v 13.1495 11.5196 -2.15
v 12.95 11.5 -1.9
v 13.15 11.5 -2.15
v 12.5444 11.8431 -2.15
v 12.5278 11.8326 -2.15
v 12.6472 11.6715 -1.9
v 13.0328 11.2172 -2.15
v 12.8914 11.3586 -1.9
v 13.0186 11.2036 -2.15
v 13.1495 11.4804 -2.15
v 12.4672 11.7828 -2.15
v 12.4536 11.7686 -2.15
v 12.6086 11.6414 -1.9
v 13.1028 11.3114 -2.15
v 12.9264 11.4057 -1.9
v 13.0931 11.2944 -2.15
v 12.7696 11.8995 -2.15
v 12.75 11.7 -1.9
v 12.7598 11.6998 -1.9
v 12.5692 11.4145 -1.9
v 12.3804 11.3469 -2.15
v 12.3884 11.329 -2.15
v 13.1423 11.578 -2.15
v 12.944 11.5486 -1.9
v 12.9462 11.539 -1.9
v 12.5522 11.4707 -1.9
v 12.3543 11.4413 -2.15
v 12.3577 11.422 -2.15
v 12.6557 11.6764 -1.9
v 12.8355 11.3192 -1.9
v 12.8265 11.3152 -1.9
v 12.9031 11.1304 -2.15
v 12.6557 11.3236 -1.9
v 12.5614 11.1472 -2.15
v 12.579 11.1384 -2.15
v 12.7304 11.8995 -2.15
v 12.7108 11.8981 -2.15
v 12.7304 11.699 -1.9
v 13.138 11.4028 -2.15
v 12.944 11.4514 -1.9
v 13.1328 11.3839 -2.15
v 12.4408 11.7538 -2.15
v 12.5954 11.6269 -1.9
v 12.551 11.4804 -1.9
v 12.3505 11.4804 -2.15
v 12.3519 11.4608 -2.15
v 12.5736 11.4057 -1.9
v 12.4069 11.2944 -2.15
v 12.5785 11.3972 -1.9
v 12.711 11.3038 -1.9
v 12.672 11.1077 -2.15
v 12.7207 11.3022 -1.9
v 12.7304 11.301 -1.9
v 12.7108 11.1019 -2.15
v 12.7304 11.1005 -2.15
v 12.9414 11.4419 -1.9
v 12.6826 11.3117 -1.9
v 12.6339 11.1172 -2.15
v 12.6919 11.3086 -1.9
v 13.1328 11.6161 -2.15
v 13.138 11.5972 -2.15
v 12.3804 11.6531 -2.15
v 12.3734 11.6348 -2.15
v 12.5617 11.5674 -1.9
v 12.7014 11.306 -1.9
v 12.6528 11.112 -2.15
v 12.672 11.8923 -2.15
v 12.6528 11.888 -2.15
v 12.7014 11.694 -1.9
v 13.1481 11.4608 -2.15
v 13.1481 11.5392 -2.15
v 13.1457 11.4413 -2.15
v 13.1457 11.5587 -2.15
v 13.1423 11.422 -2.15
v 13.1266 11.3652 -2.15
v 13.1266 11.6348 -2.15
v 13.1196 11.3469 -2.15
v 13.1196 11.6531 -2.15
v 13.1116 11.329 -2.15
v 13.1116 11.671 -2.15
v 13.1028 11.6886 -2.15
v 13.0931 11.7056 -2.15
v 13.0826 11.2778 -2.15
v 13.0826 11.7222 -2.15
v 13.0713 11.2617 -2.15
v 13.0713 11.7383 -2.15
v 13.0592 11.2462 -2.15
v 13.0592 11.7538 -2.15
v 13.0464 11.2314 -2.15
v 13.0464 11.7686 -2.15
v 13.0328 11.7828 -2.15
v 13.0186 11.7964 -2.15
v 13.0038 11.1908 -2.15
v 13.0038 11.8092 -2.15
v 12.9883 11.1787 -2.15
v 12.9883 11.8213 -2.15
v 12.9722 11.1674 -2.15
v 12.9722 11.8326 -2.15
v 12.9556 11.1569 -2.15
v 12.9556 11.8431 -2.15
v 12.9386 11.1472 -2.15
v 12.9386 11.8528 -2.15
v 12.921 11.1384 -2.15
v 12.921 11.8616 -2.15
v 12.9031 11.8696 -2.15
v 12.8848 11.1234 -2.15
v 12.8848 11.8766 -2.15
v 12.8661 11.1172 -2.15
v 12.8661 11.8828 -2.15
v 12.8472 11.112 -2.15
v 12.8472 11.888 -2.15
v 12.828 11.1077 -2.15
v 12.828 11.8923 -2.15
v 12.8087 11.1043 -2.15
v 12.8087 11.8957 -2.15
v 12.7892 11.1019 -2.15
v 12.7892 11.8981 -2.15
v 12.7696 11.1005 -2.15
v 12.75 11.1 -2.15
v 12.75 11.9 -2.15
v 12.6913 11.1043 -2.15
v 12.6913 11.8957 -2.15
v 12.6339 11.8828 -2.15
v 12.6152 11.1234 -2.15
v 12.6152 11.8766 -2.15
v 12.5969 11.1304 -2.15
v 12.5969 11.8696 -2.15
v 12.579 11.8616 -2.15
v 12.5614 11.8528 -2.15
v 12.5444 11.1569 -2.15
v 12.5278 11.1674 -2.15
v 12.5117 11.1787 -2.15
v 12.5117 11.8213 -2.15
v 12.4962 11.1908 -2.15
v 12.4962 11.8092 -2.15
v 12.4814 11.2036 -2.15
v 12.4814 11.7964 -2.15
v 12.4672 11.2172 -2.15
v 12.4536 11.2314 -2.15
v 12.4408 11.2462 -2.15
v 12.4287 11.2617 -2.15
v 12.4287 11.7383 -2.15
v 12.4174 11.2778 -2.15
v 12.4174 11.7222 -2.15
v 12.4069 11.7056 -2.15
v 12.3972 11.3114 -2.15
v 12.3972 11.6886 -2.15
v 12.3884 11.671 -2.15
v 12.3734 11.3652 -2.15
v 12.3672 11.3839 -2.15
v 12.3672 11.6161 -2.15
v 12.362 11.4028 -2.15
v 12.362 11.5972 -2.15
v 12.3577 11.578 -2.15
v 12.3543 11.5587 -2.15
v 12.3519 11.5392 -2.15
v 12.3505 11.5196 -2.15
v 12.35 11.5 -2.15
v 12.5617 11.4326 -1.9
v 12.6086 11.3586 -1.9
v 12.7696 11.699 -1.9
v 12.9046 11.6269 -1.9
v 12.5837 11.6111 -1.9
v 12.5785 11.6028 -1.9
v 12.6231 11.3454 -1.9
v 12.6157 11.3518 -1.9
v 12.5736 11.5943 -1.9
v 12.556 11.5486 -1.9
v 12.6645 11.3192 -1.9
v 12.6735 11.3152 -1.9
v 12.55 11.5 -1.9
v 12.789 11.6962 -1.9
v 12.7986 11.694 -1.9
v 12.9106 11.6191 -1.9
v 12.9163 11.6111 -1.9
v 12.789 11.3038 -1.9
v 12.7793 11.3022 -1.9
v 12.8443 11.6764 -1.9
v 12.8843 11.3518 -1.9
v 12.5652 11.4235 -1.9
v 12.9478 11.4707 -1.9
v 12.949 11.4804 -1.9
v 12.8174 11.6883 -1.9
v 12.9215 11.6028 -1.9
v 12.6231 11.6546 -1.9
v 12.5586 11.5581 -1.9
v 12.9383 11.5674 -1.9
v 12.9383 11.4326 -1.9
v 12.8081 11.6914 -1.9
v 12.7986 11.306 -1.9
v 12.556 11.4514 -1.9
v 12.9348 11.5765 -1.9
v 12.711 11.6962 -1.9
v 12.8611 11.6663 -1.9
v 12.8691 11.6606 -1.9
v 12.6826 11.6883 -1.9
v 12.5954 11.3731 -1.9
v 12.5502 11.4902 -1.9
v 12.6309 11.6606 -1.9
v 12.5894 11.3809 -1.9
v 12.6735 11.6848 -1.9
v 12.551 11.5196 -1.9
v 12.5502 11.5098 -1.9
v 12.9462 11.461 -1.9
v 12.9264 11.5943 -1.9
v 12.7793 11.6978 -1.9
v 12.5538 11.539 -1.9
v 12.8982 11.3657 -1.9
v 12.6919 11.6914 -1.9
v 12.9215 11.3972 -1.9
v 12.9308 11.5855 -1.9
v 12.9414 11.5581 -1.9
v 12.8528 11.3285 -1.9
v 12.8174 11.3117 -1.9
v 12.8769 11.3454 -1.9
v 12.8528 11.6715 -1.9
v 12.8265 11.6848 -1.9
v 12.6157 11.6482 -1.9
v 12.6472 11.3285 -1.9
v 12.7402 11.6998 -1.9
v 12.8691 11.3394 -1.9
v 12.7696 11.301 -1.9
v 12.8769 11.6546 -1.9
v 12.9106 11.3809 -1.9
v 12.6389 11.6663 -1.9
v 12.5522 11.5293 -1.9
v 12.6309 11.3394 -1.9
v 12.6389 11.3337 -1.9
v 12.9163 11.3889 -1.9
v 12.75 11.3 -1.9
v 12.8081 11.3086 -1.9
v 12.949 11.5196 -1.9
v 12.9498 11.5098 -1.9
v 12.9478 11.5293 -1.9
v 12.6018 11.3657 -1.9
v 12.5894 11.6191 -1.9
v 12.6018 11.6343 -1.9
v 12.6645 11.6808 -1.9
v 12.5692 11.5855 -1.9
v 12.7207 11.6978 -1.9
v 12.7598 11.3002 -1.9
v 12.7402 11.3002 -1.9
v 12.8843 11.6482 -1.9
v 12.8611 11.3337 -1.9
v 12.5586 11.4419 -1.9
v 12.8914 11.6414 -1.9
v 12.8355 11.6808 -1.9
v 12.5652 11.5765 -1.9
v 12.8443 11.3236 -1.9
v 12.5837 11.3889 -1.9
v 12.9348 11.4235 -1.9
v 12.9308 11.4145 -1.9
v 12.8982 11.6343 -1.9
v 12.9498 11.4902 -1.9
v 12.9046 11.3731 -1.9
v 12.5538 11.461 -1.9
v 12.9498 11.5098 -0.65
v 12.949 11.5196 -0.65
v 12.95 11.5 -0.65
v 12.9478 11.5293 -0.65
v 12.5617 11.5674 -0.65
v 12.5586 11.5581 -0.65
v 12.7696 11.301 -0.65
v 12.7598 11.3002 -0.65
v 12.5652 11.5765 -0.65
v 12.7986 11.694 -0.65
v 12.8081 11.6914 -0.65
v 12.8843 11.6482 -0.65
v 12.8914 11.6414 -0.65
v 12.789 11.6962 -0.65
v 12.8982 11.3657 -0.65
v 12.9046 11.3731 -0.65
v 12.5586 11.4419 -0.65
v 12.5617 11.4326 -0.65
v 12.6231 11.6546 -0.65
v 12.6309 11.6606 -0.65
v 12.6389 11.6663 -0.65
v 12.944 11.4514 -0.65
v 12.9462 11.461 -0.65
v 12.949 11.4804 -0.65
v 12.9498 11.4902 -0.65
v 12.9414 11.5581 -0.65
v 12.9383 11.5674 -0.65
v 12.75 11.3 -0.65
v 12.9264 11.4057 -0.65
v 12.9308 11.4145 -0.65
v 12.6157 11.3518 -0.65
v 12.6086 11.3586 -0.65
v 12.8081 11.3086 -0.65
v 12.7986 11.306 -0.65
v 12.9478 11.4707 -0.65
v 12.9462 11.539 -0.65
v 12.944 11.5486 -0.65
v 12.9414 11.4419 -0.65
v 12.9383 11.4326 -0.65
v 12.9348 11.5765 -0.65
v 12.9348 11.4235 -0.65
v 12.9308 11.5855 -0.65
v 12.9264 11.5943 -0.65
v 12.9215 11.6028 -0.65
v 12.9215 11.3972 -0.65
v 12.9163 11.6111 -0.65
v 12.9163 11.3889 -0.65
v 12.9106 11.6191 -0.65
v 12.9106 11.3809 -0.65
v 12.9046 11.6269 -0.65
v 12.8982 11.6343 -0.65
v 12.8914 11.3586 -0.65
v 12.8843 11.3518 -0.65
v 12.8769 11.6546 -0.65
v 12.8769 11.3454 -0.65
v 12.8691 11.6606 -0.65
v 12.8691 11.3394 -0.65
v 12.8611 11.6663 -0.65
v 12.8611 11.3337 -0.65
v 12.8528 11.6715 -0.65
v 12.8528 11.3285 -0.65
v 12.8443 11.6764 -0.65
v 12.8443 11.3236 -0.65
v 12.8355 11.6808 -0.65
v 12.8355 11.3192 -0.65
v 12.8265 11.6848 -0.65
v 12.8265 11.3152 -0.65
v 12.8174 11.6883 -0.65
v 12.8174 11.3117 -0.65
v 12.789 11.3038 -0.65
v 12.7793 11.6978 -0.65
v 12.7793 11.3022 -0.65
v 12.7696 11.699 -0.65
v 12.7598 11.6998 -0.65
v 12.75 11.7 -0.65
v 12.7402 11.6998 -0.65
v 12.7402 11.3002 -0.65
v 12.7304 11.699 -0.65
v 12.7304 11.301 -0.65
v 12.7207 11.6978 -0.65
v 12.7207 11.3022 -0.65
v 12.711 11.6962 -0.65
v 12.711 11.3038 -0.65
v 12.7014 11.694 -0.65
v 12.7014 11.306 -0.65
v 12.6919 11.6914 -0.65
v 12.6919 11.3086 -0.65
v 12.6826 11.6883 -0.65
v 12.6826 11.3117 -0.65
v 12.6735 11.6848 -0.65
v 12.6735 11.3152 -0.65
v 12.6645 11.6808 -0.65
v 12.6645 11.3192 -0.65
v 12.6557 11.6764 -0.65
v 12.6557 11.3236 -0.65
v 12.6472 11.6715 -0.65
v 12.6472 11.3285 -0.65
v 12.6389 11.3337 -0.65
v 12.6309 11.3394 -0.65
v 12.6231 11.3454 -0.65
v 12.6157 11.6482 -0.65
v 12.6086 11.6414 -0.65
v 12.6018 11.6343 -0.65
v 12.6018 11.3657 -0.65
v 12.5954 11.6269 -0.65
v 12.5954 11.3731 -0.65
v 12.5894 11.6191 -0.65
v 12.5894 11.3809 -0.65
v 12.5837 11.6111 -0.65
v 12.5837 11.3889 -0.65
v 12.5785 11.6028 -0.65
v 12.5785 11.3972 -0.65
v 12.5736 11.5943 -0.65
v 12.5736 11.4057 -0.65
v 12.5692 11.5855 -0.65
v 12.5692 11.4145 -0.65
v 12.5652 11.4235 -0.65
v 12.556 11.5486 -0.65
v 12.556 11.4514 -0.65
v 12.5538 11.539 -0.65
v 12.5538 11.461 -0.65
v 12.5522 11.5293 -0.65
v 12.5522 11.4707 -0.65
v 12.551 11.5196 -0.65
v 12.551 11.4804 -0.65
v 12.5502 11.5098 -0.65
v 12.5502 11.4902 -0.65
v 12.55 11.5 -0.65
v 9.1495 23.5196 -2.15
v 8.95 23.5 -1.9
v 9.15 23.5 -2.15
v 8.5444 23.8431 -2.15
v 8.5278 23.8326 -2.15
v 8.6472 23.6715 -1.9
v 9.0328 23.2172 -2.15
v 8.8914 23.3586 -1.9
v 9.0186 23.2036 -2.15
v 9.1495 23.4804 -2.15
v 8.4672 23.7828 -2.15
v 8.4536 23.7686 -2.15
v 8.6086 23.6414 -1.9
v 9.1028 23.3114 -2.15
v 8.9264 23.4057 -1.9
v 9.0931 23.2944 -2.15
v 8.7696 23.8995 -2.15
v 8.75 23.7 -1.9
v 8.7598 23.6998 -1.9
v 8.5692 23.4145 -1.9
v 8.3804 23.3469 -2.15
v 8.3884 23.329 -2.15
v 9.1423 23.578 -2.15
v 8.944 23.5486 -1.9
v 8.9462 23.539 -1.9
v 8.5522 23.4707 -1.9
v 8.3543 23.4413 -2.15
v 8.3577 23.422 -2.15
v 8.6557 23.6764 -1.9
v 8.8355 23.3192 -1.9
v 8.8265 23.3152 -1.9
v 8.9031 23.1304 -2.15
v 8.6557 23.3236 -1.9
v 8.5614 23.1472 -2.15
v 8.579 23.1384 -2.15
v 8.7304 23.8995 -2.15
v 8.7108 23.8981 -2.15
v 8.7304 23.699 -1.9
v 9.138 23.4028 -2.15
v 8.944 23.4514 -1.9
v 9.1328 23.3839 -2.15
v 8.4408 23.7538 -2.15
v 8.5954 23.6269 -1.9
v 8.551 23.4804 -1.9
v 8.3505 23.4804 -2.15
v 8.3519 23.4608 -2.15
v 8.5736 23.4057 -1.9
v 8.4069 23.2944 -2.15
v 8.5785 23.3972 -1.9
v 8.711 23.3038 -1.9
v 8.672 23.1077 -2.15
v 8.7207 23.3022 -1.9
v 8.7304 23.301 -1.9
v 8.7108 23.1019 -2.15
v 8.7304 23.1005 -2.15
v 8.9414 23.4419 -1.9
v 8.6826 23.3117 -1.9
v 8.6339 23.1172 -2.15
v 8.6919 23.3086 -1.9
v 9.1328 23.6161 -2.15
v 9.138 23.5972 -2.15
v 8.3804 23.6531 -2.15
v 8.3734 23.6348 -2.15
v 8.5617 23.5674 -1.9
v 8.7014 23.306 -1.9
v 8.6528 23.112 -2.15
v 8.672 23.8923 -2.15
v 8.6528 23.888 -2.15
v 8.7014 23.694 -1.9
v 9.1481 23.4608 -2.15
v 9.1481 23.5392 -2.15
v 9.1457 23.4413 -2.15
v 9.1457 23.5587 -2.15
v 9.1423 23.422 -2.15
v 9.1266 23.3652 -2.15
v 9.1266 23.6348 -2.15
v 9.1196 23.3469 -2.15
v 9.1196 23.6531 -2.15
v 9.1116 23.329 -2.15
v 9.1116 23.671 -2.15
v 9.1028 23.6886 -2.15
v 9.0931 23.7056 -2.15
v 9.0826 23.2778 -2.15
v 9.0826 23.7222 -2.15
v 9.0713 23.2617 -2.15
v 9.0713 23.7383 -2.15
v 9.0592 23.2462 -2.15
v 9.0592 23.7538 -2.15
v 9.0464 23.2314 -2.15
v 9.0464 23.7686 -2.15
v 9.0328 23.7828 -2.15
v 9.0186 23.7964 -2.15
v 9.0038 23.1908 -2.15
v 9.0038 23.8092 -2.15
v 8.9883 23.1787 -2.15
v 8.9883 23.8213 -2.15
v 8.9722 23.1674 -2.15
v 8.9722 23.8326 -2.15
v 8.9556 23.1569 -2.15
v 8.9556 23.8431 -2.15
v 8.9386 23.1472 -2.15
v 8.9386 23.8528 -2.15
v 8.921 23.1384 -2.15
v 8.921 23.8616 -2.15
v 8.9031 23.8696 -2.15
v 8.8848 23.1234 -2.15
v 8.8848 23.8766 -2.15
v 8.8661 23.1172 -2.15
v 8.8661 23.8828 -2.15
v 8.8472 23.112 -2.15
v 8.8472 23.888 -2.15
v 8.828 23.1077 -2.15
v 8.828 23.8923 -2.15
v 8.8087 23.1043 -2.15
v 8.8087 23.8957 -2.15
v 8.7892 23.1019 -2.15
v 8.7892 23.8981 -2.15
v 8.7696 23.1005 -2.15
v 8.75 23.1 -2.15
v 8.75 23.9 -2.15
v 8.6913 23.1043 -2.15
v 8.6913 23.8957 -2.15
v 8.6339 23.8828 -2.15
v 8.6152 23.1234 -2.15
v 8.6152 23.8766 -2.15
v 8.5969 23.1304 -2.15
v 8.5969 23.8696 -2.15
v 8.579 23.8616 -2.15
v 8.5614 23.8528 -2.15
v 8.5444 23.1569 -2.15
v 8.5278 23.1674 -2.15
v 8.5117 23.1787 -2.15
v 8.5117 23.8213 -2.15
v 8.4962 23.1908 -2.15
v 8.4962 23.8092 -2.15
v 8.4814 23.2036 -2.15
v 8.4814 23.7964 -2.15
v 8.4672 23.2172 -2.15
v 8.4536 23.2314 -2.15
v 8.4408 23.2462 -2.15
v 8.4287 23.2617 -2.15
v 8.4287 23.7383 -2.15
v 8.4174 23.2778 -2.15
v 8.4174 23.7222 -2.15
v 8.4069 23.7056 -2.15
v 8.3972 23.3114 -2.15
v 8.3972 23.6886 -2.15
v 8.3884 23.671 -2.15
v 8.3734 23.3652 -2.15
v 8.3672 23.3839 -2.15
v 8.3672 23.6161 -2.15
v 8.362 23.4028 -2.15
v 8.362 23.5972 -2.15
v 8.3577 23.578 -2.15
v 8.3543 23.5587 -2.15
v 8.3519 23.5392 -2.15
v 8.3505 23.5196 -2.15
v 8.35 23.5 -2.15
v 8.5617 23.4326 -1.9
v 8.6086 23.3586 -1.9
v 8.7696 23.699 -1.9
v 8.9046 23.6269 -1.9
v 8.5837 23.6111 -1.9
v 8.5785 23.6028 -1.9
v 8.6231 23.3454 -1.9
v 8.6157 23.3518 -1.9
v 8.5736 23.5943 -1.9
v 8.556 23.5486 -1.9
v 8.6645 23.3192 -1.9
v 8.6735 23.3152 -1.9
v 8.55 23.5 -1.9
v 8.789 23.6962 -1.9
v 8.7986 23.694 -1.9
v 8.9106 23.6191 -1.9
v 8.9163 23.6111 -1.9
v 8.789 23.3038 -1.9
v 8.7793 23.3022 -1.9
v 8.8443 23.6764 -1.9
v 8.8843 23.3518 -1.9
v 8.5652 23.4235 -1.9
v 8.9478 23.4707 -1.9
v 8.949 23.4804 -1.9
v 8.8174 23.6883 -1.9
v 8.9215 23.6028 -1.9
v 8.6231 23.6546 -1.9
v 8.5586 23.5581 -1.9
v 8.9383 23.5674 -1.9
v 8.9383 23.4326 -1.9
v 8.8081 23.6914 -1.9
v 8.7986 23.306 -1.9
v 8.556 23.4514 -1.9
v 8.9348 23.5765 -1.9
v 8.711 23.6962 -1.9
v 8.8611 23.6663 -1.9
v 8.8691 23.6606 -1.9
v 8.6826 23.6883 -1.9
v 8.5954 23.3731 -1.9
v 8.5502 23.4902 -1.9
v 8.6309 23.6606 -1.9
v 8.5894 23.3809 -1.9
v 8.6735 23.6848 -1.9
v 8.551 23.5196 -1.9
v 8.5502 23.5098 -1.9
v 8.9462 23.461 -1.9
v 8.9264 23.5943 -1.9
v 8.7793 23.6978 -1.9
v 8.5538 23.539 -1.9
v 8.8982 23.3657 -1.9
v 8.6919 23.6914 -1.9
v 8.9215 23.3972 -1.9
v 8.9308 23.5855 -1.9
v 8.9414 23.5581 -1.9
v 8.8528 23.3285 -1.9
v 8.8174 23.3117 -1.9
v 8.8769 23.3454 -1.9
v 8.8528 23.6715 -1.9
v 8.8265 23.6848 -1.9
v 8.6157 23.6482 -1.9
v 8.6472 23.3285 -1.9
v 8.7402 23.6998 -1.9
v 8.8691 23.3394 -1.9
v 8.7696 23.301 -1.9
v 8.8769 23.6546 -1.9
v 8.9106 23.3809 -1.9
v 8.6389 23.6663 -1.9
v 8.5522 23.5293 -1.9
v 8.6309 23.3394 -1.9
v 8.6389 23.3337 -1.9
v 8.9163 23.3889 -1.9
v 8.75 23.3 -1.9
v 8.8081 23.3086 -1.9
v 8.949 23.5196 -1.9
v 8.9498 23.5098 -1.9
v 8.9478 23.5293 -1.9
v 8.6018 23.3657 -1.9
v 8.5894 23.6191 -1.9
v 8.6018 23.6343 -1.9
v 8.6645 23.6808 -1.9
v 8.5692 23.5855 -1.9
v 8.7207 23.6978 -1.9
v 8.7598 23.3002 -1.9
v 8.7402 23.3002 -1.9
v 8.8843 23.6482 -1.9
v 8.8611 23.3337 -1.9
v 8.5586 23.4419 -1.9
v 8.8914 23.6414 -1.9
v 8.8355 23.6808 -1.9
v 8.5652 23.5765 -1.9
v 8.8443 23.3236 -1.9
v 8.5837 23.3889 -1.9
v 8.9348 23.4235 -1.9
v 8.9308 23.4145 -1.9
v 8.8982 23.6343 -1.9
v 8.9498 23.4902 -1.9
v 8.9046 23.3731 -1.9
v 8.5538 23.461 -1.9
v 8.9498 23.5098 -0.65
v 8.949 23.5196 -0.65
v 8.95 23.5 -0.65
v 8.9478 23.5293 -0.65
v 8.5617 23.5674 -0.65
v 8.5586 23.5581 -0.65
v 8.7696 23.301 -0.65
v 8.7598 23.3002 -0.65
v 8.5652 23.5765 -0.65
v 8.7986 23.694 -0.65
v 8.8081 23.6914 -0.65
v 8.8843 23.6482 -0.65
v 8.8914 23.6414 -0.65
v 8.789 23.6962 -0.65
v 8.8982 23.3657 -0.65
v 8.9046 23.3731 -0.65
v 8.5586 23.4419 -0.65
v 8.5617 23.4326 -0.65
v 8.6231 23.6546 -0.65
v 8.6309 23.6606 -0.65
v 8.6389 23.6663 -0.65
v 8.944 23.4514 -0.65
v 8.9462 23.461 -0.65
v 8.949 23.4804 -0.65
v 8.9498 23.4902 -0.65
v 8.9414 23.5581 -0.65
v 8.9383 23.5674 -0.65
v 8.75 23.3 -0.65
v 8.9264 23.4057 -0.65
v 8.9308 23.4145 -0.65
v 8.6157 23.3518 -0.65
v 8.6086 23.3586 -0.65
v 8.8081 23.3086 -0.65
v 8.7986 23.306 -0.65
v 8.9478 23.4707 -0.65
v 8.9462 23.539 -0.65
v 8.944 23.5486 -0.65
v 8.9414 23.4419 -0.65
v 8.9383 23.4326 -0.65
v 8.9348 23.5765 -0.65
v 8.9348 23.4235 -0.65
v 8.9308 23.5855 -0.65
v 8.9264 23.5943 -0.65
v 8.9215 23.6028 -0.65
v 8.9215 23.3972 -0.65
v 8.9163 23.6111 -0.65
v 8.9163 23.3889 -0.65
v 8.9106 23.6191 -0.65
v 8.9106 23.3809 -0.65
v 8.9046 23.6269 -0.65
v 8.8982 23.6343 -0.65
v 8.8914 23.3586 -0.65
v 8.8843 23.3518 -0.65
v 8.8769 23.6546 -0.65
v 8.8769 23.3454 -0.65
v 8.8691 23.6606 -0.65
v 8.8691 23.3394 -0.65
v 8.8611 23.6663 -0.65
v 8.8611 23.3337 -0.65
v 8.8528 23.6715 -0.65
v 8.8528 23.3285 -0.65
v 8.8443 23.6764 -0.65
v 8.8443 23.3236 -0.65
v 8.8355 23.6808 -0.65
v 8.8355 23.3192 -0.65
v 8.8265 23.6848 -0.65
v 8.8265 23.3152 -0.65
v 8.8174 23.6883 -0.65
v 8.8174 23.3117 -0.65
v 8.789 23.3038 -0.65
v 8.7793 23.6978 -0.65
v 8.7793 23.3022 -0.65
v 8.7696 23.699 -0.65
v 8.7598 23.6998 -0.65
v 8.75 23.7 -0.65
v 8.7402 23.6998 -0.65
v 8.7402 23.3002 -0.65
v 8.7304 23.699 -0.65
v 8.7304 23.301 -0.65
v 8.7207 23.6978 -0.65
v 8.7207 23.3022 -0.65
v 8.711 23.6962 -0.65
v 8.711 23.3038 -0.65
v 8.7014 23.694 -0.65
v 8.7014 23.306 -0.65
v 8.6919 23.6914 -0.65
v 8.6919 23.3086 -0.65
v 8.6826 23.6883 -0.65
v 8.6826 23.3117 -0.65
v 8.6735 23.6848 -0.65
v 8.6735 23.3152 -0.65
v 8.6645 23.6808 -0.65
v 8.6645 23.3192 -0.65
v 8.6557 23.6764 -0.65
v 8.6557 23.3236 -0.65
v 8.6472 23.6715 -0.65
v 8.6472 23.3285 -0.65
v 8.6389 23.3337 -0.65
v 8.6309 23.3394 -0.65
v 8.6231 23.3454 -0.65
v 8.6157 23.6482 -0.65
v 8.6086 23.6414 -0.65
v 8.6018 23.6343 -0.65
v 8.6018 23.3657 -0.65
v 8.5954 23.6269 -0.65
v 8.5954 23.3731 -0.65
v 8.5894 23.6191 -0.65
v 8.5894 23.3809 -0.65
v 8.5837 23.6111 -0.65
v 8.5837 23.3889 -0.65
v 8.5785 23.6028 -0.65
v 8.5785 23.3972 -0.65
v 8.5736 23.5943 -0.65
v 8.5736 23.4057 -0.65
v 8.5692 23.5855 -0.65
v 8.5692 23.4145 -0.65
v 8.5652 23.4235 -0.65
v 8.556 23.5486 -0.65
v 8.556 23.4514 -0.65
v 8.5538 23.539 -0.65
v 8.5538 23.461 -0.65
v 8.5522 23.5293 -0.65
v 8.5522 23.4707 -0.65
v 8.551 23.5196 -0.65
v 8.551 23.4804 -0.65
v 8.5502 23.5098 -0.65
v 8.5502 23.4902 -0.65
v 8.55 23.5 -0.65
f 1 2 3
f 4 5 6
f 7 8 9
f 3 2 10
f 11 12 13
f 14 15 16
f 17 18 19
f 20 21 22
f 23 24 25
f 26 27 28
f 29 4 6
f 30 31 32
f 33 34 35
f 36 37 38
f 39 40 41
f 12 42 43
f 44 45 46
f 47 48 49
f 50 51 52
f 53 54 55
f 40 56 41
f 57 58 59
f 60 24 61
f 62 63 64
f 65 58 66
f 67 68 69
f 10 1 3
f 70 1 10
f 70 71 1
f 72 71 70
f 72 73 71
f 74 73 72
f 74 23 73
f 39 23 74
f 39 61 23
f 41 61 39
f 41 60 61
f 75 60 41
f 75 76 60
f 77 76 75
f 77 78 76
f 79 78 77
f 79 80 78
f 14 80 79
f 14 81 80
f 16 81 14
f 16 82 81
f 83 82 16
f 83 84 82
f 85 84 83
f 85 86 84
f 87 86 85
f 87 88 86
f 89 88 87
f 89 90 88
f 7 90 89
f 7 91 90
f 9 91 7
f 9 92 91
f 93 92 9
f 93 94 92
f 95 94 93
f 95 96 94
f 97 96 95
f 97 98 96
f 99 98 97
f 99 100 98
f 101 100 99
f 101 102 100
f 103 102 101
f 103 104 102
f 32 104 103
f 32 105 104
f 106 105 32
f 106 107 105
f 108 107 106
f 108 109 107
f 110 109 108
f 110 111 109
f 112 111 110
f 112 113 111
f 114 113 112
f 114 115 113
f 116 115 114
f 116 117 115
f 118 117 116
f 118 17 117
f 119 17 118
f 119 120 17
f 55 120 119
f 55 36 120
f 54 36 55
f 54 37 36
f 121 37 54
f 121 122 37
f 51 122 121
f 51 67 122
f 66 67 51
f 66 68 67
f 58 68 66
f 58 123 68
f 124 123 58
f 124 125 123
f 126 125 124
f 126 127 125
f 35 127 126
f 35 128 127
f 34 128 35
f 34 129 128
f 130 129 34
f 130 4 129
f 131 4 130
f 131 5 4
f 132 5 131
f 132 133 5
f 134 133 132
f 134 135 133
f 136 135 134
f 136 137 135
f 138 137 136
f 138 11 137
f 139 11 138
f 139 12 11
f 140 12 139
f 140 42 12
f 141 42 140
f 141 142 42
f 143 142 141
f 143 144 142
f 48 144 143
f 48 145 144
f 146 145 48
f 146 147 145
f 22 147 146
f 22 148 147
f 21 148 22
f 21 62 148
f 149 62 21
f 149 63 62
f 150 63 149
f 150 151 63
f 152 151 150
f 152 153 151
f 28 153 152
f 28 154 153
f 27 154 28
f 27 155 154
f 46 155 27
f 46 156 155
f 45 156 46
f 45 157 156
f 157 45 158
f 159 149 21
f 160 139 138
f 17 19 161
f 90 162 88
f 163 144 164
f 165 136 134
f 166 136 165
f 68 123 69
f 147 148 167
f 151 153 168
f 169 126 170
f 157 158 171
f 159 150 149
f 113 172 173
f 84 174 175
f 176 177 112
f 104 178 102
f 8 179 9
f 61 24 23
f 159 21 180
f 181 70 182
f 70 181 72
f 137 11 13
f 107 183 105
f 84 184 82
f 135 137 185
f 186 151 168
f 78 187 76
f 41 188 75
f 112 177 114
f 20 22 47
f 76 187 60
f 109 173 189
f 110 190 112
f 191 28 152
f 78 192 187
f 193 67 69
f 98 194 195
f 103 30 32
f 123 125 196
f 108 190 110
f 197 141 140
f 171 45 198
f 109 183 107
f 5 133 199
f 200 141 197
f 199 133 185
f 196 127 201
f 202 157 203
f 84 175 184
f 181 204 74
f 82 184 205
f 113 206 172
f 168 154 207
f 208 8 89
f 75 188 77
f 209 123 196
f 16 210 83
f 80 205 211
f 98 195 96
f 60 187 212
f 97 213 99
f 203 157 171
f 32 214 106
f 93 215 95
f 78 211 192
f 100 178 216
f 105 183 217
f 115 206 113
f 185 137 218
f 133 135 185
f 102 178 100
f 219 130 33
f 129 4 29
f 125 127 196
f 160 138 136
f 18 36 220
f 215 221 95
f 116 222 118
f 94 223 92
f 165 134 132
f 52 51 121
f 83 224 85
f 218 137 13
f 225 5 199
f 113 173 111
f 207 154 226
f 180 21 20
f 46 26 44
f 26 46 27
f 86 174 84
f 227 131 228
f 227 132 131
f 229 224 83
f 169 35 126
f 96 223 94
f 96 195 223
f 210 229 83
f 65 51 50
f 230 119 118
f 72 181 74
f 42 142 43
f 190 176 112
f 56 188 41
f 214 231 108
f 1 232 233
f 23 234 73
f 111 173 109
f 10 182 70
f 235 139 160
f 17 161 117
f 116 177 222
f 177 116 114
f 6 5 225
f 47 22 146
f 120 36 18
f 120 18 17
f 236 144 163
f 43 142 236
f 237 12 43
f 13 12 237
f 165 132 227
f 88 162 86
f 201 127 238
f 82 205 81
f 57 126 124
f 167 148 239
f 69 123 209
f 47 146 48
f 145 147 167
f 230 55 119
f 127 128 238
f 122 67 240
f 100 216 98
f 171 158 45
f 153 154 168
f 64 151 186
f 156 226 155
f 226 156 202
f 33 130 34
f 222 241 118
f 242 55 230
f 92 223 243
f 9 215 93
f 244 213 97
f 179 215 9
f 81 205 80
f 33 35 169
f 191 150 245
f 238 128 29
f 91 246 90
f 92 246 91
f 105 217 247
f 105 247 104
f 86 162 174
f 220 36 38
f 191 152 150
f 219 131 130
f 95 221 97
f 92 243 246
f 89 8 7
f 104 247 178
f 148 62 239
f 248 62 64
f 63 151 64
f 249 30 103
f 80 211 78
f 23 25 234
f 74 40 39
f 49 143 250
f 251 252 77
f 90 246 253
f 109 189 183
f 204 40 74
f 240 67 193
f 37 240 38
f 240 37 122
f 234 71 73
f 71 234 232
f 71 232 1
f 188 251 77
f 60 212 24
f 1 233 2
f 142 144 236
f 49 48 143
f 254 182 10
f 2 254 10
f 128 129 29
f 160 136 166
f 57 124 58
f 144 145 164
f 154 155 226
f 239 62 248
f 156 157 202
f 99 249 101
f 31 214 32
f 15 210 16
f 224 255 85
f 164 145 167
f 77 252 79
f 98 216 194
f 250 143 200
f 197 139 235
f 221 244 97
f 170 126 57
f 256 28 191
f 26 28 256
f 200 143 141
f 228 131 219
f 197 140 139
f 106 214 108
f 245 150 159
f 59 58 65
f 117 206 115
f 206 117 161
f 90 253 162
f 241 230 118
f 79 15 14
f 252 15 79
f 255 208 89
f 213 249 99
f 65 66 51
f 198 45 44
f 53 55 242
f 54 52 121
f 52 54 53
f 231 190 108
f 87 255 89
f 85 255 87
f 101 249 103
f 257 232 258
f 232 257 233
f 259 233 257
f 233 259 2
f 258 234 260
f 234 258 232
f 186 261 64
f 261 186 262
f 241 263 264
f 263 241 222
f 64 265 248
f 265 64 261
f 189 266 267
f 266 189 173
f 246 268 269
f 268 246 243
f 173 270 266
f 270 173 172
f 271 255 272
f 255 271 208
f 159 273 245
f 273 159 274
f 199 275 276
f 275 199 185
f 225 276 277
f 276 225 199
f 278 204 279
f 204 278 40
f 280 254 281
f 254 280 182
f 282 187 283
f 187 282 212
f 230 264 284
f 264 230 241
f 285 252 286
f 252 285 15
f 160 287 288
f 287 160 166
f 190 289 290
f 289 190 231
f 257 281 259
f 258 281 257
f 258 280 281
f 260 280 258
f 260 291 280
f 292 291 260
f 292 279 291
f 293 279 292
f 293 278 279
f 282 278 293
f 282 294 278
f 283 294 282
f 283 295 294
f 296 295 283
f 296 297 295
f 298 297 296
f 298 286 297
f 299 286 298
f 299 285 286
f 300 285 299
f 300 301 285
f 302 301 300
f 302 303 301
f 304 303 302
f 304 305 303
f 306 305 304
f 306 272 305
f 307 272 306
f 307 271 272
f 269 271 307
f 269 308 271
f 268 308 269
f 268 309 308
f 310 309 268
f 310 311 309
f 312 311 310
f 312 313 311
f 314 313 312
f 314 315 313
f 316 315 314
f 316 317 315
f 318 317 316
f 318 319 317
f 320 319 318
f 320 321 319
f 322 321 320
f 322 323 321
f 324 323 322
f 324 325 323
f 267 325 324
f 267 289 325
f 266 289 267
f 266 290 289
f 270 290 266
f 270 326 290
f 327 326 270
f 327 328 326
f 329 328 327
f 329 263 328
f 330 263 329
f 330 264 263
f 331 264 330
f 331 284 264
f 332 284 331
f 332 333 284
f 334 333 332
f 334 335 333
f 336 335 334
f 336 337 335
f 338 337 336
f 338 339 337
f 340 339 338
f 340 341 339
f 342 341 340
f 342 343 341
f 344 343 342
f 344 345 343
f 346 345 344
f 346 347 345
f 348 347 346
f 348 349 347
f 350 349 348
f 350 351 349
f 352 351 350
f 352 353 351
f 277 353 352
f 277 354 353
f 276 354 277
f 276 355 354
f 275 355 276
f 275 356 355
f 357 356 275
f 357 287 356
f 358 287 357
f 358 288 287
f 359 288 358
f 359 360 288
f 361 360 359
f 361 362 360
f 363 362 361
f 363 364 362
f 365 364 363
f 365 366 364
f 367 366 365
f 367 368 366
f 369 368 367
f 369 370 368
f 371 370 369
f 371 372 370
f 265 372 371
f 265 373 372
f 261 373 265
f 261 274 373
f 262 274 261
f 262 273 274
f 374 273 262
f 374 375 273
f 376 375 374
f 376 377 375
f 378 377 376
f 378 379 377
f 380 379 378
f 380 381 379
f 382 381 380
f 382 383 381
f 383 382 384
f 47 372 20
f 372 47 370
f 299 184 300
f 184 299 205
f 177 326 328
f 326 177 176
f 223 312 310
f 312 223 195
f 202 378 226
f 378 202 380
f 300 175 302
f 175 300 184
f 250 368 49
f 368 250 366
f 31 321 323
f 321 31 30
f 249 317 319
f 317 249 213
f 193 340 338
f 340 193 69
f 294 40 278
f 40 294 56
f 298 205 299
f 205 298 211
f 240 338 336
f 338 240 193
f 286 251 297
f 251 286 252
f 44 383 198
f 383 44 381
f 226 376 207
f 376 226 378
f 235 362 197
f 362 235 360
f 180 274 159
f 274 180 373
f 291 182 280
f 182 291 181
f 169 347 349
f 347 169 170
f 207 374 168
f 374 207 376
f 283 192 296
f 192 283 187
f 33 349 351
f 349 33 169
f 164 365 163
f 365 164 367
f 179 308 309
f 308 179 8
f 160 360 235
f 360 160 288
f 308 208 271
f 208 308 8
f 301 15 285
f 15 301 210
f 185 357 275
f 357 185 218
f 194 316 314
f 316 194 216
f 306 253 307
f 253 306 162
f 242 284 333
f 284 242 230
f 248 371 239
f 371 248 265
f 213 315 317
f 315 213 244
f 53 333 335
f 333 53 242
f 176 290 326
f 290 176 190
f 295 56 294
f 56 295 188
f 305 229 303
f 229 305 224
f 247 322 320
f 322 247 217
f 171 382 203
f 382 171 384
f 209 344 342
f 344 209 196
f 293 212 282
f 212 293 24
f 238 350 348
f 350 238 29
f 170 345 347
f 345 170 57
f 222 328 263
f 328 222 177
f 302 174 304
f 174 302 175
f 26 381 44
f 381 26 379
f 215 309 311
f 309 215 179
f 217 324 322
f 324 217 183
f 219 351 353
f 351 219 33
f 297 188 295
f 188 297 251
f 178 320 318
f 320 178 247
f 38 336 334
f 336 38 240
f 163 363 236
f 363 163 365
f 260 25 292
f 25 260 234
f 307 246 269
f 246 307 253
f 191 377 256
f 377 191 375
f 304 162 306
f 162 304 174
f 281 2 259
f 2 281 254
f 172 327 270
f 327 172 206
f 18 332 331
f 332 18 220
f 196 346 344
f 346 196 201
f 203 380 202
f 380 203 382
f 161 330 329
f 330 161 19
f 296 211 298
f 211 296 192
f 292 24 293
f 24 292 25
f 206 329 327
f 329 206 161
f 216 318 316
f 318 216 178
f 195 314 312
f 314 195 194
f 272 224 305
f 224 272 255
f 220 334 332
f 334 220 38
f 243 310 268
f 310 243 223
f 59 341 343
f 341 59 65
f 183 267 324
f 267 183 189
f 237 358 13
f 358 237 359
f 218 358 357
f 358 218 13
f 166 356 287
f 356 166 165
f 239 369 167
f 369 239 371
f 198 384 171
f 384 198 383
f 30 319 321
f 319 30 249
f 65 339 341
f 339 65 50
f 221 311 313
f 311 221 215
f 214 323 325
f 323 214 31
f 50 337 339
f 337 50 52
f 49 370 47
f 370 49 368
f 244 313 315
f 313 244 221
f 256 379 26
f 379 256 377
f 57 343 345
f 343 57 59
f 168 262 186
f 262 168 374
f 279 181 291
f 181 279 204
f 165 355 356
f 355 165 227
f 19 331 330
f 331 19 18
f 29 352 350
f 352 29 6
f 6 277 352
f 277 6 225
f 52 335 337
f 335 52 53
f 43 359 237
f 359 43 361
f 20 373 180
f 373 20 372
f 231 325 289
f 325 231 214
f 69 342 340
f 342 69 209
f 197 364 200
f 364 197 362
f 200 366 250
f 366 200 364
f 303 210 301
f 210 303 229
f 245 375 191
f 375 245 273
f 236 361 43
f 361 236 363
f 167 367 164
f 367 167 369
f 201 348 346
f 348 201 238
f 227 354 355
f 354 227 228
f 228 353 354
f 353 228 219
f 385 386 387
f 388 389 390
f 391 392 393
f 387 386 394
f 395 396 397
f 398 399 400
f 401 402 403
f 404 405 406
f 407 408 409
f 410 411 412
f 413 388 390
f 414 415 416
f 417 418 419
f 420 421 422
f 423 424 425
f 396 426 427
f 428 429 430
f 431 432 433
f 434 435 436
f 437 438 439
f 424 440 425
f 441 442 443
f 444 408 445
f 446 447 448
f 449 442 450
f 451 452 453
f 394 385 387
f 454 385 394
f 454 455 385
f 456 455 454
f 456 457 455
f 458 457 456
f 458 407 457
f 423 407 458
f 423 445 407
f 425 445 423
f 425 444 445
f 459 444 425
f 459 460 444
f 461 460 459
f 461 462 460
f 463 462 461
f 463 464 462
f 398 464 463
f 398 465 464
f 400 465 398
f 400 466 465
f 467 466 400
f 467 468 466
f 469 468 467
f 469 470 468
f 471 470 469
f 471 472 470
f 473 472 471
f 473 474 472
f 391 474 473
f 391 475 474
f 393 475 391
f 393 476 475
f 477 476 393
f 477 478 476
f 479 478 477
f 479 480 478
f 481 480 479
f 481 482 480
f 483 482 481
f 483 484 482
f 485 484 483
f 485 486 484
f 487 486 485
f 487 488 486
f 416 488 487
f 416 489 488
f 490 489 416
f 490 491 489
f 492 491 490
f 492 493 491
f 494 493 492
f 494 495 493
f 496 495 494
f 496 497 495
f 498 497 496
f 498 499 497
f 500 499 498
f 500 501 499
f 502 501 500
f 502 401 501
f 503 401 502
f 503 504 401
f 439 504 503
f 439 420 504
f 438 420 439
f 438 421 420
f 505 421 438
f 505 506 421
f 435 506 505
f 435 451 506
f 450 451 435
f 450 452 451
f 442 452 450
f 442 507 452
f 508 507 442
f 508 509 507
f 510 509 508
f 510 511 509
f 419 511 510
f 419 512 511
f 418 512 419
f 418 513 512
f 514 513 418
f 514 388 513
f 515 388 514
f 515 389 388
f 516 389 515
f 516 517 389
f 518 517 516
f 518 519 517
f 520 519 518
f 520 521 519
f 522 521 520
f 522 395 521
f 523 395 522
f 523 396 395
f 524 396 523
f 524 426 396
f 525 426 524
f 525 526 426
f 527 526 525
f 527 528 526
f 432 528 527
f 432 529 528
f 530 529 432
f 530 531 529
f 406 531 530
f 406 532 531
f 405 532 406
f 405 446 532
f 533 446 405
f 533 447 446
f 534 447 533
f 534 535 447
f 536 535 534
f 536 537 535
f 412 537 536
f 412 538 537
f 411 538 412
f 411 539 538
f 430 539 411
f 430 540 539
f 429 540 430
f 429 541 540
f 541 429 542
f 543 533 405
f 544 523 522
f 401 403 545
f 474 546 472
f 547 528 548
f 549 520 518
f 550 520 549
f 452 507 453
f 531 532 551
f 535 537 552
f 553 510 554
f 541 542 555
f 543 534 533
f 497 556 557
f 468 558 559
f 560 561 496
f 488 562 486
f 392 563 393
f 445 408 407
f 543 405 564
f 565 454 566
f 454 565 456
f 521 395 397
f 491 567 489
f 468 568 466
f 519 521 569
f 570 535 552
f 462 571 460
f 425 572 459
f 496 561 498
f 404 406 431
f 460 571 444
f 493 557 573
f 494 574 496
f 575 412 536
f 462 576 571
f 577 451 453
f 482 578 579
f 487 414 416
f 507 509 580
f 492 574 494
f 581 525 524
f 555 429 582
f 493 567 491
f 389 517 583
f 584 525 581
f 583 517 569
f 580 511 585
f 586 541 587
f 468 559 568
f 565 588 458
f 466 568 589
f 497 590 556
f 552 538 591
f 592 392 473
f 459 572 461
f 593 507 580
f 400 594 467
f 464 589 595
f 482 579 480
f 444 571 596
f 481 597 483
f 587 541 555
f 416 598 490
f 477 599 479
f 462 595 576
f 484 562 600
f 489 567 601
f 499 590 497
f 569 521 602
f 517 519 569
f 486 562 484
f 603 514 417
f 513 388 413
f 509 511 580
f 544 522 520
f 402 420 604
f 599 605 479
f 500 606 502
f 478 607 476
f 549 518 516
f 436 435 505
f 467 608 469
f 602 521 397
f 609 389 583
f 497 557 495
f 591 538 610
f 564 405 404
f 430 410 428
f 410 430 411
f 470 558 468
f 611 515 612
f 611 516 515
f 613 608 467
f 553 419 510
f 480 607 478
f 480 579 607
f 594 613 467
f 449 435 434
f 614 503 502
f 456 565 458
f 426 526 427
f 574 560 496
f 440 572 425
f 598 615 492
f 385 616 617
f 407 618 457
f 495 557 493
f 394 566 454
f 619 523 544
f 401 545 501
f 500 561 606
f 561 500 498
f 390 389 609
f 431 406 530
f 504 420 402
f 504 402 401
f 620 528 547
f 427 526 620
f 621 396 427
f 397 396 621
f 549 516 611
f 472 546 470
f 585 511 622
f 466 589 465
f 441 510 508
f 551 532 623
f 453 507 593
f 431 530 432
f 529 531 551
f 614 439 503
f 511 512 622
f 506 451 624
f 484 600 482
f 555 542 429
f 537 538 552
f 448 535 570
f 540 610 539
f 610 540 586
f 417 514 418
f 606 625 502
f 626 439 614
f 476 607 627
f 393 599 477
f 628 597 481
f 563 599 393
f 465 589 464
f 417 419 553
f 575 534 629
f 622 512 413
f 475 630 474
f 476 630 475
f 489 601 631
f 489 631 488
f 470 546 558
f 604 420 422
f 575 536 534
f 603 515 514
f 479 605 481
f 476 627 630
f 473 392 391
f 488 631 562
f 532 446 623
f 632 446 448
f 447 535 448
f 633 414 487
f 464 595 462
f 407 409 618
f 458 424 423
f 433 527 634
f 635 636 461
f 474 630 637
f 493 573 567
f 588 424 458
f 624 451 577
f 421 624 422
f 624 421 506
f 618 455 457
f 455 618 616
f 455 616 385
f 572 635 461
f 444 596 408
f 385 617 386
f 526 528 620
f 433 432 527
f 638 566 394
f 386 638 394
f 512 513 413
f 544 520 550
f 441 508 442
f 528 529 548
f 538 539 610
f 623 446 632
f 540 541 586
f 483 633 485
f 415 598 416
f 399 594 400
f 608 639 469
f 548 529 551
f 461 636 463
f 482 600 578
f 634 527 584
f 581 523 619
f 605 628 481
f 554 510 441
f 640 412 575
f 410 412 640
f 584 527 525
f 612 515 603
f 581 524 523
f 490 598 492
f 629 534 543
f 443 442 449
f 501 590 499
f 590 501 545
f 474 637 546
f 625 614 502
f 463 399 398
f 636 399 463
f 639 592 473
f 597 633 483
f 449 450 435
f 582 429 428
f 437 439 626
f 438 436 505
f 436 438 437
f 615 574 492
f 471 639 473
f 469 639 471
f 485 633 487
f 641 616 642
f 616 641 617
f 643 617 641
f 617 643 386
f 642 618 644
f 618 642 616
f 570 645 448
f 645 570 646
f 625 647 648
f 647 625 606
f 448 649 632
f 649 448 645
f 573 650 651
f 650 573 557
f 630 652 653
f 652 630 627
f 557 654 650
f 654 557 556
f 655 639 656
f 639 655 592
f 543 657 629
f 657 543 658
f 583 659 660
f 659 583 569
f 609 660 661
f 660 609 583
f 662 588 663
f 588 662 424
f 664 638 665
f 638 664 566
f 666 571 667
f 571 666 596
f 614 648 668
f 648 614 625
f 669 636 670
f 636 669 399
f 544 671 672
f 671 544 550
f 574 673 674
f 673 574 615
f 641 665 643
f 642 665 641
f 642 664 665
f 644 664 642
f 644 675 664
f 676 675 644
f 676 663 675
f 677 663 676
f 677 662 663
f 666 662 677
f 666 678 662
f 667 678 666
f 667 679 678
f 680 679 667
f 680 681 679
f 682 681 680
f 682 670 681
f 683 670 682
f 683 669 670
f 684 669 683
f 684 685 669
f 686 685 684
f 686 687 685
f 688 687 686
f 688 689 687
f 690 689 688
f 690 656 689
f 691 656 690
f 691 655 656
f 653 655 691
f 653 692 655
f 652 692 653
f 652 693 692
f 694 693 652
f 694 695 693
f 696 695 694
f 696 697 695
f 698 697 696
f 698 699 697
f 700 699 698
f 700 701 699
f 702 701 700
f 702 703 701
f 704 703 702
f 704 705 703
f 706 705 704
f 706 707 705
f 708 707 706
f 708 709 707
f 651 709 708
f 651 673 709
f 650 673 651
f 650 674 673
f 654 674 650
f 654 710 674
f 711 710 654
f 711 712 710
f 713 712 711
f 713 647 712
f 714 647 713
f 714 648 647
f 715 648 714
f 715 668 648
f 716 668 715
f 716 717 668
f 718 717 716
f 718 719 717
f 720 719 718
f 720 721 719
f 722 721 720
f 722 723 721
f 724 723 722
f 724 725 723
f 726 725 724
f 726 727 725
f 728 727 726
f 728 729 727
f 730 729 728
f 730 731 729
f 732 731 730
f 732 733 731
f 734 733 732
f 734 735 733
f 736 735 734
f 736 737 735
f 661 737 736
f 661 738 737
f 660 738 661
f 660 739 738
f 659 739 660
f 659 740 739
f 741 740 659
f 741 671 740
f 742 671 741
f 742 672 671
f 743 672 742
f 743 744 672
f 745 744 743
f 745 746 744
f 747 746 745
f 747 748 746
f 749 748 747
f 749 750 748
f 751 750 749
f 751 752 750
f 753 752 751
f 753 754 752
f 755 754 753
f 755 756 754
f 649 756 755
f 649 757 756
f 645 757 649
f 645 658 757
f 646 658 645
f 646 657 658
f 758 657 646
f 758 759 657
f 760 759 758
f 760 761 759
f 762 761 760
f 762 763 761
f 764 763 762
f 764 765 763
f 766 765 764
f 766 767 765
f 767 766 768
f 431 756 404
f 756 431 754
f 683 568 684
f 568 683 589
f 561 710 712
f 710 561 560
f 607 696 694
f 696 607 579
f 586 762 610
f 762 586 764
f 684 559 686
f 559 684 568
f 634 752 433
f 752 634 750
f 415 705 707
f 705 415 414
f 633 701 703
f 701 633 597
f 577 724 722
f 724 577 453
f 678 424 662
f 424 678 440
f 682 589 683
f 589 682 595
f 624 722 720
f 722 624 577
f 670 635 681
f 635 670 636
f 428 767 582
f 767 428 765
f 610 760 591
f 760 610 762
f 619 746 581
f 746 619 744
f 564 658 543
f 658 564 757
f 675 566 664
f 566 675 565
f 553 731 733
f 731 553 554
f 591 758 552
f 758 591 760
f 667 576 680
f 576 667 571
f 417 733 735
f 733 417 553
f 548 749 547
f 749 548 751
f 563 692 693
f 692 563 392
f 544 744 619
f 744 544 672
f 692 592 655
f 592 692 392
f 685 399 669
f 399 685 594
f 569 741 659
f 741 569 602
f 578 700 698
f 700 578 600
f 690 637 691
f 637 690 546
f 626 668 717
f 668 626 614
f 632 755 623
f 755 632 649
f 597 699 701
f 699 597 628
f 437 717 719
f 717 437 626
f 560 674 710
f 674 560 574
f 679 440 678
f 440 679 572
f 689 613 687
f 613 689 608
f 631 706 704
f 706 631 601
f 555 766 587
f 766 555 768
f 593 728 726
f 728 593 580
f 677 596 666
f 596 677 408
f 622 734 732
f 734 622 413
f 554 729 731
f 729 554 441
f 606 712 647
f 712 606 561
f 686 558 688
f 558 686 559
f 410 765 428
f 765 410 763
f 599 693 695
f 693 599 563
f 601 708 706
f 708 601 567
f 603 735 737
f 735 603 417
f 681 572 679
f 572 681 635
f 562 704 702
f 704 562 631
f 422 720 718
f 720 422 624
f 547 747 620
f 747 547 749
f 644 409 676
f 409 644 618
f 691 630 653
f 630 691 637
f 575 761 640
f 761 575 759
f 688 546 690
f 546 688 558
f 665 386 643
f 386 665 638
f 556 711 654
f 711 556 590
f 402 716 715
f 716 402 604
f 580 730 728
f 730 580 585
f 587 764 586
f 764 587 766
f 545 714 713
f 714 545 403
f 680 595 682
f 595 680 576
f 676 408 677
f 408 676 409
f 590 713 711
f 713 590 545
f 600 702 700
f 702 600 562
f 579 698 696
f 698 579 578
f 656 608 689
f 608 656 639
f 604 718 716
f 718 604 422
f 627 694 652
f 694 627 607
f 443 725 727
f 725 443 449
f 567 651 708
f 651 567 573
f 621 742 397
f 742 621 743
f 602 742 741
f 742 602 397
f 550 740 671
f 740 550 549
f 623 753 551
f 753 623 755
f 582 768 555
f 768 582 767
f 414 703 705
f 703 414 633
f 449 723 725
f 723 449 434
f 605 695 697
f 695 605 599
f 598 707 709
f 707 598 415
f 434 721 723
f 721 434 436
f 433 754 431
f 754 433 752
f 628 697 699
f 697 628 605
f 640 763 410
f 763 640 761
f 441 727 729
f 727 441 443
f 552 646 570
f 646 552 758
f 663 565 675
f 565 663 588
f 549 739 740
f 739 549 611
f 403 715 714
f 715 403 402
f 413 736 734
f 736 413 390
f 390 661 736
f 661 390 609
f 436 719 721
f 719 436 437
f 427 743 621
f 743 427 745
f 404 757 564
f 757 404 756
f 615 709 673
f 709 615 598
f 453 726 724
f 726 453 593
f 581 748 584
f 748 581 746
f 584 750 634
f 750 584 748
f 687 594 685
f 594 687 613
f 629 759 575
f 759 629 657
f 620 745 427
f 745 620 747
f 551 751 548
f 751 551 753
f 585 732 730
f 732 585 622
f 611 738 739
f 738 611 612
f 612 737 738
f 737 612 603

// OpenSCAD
// Import the rounded_poly module
$fn=128;

module screw()
{
    union() {
        cylinder(0.25, 0.4, 0.2);
        cylinder(1.5, 0.2, 0.2);
    }
}

module elec_backplate_fixings()
{
    union()
    {

        //translate([6.25, 17.5,-2.15]) screw();
        translate([12.75, 11.5,-2.15]) screw();
        translate([8.75, 23.5,-2.15]) screw();
    }    
}

elec_backplate_fixings();
